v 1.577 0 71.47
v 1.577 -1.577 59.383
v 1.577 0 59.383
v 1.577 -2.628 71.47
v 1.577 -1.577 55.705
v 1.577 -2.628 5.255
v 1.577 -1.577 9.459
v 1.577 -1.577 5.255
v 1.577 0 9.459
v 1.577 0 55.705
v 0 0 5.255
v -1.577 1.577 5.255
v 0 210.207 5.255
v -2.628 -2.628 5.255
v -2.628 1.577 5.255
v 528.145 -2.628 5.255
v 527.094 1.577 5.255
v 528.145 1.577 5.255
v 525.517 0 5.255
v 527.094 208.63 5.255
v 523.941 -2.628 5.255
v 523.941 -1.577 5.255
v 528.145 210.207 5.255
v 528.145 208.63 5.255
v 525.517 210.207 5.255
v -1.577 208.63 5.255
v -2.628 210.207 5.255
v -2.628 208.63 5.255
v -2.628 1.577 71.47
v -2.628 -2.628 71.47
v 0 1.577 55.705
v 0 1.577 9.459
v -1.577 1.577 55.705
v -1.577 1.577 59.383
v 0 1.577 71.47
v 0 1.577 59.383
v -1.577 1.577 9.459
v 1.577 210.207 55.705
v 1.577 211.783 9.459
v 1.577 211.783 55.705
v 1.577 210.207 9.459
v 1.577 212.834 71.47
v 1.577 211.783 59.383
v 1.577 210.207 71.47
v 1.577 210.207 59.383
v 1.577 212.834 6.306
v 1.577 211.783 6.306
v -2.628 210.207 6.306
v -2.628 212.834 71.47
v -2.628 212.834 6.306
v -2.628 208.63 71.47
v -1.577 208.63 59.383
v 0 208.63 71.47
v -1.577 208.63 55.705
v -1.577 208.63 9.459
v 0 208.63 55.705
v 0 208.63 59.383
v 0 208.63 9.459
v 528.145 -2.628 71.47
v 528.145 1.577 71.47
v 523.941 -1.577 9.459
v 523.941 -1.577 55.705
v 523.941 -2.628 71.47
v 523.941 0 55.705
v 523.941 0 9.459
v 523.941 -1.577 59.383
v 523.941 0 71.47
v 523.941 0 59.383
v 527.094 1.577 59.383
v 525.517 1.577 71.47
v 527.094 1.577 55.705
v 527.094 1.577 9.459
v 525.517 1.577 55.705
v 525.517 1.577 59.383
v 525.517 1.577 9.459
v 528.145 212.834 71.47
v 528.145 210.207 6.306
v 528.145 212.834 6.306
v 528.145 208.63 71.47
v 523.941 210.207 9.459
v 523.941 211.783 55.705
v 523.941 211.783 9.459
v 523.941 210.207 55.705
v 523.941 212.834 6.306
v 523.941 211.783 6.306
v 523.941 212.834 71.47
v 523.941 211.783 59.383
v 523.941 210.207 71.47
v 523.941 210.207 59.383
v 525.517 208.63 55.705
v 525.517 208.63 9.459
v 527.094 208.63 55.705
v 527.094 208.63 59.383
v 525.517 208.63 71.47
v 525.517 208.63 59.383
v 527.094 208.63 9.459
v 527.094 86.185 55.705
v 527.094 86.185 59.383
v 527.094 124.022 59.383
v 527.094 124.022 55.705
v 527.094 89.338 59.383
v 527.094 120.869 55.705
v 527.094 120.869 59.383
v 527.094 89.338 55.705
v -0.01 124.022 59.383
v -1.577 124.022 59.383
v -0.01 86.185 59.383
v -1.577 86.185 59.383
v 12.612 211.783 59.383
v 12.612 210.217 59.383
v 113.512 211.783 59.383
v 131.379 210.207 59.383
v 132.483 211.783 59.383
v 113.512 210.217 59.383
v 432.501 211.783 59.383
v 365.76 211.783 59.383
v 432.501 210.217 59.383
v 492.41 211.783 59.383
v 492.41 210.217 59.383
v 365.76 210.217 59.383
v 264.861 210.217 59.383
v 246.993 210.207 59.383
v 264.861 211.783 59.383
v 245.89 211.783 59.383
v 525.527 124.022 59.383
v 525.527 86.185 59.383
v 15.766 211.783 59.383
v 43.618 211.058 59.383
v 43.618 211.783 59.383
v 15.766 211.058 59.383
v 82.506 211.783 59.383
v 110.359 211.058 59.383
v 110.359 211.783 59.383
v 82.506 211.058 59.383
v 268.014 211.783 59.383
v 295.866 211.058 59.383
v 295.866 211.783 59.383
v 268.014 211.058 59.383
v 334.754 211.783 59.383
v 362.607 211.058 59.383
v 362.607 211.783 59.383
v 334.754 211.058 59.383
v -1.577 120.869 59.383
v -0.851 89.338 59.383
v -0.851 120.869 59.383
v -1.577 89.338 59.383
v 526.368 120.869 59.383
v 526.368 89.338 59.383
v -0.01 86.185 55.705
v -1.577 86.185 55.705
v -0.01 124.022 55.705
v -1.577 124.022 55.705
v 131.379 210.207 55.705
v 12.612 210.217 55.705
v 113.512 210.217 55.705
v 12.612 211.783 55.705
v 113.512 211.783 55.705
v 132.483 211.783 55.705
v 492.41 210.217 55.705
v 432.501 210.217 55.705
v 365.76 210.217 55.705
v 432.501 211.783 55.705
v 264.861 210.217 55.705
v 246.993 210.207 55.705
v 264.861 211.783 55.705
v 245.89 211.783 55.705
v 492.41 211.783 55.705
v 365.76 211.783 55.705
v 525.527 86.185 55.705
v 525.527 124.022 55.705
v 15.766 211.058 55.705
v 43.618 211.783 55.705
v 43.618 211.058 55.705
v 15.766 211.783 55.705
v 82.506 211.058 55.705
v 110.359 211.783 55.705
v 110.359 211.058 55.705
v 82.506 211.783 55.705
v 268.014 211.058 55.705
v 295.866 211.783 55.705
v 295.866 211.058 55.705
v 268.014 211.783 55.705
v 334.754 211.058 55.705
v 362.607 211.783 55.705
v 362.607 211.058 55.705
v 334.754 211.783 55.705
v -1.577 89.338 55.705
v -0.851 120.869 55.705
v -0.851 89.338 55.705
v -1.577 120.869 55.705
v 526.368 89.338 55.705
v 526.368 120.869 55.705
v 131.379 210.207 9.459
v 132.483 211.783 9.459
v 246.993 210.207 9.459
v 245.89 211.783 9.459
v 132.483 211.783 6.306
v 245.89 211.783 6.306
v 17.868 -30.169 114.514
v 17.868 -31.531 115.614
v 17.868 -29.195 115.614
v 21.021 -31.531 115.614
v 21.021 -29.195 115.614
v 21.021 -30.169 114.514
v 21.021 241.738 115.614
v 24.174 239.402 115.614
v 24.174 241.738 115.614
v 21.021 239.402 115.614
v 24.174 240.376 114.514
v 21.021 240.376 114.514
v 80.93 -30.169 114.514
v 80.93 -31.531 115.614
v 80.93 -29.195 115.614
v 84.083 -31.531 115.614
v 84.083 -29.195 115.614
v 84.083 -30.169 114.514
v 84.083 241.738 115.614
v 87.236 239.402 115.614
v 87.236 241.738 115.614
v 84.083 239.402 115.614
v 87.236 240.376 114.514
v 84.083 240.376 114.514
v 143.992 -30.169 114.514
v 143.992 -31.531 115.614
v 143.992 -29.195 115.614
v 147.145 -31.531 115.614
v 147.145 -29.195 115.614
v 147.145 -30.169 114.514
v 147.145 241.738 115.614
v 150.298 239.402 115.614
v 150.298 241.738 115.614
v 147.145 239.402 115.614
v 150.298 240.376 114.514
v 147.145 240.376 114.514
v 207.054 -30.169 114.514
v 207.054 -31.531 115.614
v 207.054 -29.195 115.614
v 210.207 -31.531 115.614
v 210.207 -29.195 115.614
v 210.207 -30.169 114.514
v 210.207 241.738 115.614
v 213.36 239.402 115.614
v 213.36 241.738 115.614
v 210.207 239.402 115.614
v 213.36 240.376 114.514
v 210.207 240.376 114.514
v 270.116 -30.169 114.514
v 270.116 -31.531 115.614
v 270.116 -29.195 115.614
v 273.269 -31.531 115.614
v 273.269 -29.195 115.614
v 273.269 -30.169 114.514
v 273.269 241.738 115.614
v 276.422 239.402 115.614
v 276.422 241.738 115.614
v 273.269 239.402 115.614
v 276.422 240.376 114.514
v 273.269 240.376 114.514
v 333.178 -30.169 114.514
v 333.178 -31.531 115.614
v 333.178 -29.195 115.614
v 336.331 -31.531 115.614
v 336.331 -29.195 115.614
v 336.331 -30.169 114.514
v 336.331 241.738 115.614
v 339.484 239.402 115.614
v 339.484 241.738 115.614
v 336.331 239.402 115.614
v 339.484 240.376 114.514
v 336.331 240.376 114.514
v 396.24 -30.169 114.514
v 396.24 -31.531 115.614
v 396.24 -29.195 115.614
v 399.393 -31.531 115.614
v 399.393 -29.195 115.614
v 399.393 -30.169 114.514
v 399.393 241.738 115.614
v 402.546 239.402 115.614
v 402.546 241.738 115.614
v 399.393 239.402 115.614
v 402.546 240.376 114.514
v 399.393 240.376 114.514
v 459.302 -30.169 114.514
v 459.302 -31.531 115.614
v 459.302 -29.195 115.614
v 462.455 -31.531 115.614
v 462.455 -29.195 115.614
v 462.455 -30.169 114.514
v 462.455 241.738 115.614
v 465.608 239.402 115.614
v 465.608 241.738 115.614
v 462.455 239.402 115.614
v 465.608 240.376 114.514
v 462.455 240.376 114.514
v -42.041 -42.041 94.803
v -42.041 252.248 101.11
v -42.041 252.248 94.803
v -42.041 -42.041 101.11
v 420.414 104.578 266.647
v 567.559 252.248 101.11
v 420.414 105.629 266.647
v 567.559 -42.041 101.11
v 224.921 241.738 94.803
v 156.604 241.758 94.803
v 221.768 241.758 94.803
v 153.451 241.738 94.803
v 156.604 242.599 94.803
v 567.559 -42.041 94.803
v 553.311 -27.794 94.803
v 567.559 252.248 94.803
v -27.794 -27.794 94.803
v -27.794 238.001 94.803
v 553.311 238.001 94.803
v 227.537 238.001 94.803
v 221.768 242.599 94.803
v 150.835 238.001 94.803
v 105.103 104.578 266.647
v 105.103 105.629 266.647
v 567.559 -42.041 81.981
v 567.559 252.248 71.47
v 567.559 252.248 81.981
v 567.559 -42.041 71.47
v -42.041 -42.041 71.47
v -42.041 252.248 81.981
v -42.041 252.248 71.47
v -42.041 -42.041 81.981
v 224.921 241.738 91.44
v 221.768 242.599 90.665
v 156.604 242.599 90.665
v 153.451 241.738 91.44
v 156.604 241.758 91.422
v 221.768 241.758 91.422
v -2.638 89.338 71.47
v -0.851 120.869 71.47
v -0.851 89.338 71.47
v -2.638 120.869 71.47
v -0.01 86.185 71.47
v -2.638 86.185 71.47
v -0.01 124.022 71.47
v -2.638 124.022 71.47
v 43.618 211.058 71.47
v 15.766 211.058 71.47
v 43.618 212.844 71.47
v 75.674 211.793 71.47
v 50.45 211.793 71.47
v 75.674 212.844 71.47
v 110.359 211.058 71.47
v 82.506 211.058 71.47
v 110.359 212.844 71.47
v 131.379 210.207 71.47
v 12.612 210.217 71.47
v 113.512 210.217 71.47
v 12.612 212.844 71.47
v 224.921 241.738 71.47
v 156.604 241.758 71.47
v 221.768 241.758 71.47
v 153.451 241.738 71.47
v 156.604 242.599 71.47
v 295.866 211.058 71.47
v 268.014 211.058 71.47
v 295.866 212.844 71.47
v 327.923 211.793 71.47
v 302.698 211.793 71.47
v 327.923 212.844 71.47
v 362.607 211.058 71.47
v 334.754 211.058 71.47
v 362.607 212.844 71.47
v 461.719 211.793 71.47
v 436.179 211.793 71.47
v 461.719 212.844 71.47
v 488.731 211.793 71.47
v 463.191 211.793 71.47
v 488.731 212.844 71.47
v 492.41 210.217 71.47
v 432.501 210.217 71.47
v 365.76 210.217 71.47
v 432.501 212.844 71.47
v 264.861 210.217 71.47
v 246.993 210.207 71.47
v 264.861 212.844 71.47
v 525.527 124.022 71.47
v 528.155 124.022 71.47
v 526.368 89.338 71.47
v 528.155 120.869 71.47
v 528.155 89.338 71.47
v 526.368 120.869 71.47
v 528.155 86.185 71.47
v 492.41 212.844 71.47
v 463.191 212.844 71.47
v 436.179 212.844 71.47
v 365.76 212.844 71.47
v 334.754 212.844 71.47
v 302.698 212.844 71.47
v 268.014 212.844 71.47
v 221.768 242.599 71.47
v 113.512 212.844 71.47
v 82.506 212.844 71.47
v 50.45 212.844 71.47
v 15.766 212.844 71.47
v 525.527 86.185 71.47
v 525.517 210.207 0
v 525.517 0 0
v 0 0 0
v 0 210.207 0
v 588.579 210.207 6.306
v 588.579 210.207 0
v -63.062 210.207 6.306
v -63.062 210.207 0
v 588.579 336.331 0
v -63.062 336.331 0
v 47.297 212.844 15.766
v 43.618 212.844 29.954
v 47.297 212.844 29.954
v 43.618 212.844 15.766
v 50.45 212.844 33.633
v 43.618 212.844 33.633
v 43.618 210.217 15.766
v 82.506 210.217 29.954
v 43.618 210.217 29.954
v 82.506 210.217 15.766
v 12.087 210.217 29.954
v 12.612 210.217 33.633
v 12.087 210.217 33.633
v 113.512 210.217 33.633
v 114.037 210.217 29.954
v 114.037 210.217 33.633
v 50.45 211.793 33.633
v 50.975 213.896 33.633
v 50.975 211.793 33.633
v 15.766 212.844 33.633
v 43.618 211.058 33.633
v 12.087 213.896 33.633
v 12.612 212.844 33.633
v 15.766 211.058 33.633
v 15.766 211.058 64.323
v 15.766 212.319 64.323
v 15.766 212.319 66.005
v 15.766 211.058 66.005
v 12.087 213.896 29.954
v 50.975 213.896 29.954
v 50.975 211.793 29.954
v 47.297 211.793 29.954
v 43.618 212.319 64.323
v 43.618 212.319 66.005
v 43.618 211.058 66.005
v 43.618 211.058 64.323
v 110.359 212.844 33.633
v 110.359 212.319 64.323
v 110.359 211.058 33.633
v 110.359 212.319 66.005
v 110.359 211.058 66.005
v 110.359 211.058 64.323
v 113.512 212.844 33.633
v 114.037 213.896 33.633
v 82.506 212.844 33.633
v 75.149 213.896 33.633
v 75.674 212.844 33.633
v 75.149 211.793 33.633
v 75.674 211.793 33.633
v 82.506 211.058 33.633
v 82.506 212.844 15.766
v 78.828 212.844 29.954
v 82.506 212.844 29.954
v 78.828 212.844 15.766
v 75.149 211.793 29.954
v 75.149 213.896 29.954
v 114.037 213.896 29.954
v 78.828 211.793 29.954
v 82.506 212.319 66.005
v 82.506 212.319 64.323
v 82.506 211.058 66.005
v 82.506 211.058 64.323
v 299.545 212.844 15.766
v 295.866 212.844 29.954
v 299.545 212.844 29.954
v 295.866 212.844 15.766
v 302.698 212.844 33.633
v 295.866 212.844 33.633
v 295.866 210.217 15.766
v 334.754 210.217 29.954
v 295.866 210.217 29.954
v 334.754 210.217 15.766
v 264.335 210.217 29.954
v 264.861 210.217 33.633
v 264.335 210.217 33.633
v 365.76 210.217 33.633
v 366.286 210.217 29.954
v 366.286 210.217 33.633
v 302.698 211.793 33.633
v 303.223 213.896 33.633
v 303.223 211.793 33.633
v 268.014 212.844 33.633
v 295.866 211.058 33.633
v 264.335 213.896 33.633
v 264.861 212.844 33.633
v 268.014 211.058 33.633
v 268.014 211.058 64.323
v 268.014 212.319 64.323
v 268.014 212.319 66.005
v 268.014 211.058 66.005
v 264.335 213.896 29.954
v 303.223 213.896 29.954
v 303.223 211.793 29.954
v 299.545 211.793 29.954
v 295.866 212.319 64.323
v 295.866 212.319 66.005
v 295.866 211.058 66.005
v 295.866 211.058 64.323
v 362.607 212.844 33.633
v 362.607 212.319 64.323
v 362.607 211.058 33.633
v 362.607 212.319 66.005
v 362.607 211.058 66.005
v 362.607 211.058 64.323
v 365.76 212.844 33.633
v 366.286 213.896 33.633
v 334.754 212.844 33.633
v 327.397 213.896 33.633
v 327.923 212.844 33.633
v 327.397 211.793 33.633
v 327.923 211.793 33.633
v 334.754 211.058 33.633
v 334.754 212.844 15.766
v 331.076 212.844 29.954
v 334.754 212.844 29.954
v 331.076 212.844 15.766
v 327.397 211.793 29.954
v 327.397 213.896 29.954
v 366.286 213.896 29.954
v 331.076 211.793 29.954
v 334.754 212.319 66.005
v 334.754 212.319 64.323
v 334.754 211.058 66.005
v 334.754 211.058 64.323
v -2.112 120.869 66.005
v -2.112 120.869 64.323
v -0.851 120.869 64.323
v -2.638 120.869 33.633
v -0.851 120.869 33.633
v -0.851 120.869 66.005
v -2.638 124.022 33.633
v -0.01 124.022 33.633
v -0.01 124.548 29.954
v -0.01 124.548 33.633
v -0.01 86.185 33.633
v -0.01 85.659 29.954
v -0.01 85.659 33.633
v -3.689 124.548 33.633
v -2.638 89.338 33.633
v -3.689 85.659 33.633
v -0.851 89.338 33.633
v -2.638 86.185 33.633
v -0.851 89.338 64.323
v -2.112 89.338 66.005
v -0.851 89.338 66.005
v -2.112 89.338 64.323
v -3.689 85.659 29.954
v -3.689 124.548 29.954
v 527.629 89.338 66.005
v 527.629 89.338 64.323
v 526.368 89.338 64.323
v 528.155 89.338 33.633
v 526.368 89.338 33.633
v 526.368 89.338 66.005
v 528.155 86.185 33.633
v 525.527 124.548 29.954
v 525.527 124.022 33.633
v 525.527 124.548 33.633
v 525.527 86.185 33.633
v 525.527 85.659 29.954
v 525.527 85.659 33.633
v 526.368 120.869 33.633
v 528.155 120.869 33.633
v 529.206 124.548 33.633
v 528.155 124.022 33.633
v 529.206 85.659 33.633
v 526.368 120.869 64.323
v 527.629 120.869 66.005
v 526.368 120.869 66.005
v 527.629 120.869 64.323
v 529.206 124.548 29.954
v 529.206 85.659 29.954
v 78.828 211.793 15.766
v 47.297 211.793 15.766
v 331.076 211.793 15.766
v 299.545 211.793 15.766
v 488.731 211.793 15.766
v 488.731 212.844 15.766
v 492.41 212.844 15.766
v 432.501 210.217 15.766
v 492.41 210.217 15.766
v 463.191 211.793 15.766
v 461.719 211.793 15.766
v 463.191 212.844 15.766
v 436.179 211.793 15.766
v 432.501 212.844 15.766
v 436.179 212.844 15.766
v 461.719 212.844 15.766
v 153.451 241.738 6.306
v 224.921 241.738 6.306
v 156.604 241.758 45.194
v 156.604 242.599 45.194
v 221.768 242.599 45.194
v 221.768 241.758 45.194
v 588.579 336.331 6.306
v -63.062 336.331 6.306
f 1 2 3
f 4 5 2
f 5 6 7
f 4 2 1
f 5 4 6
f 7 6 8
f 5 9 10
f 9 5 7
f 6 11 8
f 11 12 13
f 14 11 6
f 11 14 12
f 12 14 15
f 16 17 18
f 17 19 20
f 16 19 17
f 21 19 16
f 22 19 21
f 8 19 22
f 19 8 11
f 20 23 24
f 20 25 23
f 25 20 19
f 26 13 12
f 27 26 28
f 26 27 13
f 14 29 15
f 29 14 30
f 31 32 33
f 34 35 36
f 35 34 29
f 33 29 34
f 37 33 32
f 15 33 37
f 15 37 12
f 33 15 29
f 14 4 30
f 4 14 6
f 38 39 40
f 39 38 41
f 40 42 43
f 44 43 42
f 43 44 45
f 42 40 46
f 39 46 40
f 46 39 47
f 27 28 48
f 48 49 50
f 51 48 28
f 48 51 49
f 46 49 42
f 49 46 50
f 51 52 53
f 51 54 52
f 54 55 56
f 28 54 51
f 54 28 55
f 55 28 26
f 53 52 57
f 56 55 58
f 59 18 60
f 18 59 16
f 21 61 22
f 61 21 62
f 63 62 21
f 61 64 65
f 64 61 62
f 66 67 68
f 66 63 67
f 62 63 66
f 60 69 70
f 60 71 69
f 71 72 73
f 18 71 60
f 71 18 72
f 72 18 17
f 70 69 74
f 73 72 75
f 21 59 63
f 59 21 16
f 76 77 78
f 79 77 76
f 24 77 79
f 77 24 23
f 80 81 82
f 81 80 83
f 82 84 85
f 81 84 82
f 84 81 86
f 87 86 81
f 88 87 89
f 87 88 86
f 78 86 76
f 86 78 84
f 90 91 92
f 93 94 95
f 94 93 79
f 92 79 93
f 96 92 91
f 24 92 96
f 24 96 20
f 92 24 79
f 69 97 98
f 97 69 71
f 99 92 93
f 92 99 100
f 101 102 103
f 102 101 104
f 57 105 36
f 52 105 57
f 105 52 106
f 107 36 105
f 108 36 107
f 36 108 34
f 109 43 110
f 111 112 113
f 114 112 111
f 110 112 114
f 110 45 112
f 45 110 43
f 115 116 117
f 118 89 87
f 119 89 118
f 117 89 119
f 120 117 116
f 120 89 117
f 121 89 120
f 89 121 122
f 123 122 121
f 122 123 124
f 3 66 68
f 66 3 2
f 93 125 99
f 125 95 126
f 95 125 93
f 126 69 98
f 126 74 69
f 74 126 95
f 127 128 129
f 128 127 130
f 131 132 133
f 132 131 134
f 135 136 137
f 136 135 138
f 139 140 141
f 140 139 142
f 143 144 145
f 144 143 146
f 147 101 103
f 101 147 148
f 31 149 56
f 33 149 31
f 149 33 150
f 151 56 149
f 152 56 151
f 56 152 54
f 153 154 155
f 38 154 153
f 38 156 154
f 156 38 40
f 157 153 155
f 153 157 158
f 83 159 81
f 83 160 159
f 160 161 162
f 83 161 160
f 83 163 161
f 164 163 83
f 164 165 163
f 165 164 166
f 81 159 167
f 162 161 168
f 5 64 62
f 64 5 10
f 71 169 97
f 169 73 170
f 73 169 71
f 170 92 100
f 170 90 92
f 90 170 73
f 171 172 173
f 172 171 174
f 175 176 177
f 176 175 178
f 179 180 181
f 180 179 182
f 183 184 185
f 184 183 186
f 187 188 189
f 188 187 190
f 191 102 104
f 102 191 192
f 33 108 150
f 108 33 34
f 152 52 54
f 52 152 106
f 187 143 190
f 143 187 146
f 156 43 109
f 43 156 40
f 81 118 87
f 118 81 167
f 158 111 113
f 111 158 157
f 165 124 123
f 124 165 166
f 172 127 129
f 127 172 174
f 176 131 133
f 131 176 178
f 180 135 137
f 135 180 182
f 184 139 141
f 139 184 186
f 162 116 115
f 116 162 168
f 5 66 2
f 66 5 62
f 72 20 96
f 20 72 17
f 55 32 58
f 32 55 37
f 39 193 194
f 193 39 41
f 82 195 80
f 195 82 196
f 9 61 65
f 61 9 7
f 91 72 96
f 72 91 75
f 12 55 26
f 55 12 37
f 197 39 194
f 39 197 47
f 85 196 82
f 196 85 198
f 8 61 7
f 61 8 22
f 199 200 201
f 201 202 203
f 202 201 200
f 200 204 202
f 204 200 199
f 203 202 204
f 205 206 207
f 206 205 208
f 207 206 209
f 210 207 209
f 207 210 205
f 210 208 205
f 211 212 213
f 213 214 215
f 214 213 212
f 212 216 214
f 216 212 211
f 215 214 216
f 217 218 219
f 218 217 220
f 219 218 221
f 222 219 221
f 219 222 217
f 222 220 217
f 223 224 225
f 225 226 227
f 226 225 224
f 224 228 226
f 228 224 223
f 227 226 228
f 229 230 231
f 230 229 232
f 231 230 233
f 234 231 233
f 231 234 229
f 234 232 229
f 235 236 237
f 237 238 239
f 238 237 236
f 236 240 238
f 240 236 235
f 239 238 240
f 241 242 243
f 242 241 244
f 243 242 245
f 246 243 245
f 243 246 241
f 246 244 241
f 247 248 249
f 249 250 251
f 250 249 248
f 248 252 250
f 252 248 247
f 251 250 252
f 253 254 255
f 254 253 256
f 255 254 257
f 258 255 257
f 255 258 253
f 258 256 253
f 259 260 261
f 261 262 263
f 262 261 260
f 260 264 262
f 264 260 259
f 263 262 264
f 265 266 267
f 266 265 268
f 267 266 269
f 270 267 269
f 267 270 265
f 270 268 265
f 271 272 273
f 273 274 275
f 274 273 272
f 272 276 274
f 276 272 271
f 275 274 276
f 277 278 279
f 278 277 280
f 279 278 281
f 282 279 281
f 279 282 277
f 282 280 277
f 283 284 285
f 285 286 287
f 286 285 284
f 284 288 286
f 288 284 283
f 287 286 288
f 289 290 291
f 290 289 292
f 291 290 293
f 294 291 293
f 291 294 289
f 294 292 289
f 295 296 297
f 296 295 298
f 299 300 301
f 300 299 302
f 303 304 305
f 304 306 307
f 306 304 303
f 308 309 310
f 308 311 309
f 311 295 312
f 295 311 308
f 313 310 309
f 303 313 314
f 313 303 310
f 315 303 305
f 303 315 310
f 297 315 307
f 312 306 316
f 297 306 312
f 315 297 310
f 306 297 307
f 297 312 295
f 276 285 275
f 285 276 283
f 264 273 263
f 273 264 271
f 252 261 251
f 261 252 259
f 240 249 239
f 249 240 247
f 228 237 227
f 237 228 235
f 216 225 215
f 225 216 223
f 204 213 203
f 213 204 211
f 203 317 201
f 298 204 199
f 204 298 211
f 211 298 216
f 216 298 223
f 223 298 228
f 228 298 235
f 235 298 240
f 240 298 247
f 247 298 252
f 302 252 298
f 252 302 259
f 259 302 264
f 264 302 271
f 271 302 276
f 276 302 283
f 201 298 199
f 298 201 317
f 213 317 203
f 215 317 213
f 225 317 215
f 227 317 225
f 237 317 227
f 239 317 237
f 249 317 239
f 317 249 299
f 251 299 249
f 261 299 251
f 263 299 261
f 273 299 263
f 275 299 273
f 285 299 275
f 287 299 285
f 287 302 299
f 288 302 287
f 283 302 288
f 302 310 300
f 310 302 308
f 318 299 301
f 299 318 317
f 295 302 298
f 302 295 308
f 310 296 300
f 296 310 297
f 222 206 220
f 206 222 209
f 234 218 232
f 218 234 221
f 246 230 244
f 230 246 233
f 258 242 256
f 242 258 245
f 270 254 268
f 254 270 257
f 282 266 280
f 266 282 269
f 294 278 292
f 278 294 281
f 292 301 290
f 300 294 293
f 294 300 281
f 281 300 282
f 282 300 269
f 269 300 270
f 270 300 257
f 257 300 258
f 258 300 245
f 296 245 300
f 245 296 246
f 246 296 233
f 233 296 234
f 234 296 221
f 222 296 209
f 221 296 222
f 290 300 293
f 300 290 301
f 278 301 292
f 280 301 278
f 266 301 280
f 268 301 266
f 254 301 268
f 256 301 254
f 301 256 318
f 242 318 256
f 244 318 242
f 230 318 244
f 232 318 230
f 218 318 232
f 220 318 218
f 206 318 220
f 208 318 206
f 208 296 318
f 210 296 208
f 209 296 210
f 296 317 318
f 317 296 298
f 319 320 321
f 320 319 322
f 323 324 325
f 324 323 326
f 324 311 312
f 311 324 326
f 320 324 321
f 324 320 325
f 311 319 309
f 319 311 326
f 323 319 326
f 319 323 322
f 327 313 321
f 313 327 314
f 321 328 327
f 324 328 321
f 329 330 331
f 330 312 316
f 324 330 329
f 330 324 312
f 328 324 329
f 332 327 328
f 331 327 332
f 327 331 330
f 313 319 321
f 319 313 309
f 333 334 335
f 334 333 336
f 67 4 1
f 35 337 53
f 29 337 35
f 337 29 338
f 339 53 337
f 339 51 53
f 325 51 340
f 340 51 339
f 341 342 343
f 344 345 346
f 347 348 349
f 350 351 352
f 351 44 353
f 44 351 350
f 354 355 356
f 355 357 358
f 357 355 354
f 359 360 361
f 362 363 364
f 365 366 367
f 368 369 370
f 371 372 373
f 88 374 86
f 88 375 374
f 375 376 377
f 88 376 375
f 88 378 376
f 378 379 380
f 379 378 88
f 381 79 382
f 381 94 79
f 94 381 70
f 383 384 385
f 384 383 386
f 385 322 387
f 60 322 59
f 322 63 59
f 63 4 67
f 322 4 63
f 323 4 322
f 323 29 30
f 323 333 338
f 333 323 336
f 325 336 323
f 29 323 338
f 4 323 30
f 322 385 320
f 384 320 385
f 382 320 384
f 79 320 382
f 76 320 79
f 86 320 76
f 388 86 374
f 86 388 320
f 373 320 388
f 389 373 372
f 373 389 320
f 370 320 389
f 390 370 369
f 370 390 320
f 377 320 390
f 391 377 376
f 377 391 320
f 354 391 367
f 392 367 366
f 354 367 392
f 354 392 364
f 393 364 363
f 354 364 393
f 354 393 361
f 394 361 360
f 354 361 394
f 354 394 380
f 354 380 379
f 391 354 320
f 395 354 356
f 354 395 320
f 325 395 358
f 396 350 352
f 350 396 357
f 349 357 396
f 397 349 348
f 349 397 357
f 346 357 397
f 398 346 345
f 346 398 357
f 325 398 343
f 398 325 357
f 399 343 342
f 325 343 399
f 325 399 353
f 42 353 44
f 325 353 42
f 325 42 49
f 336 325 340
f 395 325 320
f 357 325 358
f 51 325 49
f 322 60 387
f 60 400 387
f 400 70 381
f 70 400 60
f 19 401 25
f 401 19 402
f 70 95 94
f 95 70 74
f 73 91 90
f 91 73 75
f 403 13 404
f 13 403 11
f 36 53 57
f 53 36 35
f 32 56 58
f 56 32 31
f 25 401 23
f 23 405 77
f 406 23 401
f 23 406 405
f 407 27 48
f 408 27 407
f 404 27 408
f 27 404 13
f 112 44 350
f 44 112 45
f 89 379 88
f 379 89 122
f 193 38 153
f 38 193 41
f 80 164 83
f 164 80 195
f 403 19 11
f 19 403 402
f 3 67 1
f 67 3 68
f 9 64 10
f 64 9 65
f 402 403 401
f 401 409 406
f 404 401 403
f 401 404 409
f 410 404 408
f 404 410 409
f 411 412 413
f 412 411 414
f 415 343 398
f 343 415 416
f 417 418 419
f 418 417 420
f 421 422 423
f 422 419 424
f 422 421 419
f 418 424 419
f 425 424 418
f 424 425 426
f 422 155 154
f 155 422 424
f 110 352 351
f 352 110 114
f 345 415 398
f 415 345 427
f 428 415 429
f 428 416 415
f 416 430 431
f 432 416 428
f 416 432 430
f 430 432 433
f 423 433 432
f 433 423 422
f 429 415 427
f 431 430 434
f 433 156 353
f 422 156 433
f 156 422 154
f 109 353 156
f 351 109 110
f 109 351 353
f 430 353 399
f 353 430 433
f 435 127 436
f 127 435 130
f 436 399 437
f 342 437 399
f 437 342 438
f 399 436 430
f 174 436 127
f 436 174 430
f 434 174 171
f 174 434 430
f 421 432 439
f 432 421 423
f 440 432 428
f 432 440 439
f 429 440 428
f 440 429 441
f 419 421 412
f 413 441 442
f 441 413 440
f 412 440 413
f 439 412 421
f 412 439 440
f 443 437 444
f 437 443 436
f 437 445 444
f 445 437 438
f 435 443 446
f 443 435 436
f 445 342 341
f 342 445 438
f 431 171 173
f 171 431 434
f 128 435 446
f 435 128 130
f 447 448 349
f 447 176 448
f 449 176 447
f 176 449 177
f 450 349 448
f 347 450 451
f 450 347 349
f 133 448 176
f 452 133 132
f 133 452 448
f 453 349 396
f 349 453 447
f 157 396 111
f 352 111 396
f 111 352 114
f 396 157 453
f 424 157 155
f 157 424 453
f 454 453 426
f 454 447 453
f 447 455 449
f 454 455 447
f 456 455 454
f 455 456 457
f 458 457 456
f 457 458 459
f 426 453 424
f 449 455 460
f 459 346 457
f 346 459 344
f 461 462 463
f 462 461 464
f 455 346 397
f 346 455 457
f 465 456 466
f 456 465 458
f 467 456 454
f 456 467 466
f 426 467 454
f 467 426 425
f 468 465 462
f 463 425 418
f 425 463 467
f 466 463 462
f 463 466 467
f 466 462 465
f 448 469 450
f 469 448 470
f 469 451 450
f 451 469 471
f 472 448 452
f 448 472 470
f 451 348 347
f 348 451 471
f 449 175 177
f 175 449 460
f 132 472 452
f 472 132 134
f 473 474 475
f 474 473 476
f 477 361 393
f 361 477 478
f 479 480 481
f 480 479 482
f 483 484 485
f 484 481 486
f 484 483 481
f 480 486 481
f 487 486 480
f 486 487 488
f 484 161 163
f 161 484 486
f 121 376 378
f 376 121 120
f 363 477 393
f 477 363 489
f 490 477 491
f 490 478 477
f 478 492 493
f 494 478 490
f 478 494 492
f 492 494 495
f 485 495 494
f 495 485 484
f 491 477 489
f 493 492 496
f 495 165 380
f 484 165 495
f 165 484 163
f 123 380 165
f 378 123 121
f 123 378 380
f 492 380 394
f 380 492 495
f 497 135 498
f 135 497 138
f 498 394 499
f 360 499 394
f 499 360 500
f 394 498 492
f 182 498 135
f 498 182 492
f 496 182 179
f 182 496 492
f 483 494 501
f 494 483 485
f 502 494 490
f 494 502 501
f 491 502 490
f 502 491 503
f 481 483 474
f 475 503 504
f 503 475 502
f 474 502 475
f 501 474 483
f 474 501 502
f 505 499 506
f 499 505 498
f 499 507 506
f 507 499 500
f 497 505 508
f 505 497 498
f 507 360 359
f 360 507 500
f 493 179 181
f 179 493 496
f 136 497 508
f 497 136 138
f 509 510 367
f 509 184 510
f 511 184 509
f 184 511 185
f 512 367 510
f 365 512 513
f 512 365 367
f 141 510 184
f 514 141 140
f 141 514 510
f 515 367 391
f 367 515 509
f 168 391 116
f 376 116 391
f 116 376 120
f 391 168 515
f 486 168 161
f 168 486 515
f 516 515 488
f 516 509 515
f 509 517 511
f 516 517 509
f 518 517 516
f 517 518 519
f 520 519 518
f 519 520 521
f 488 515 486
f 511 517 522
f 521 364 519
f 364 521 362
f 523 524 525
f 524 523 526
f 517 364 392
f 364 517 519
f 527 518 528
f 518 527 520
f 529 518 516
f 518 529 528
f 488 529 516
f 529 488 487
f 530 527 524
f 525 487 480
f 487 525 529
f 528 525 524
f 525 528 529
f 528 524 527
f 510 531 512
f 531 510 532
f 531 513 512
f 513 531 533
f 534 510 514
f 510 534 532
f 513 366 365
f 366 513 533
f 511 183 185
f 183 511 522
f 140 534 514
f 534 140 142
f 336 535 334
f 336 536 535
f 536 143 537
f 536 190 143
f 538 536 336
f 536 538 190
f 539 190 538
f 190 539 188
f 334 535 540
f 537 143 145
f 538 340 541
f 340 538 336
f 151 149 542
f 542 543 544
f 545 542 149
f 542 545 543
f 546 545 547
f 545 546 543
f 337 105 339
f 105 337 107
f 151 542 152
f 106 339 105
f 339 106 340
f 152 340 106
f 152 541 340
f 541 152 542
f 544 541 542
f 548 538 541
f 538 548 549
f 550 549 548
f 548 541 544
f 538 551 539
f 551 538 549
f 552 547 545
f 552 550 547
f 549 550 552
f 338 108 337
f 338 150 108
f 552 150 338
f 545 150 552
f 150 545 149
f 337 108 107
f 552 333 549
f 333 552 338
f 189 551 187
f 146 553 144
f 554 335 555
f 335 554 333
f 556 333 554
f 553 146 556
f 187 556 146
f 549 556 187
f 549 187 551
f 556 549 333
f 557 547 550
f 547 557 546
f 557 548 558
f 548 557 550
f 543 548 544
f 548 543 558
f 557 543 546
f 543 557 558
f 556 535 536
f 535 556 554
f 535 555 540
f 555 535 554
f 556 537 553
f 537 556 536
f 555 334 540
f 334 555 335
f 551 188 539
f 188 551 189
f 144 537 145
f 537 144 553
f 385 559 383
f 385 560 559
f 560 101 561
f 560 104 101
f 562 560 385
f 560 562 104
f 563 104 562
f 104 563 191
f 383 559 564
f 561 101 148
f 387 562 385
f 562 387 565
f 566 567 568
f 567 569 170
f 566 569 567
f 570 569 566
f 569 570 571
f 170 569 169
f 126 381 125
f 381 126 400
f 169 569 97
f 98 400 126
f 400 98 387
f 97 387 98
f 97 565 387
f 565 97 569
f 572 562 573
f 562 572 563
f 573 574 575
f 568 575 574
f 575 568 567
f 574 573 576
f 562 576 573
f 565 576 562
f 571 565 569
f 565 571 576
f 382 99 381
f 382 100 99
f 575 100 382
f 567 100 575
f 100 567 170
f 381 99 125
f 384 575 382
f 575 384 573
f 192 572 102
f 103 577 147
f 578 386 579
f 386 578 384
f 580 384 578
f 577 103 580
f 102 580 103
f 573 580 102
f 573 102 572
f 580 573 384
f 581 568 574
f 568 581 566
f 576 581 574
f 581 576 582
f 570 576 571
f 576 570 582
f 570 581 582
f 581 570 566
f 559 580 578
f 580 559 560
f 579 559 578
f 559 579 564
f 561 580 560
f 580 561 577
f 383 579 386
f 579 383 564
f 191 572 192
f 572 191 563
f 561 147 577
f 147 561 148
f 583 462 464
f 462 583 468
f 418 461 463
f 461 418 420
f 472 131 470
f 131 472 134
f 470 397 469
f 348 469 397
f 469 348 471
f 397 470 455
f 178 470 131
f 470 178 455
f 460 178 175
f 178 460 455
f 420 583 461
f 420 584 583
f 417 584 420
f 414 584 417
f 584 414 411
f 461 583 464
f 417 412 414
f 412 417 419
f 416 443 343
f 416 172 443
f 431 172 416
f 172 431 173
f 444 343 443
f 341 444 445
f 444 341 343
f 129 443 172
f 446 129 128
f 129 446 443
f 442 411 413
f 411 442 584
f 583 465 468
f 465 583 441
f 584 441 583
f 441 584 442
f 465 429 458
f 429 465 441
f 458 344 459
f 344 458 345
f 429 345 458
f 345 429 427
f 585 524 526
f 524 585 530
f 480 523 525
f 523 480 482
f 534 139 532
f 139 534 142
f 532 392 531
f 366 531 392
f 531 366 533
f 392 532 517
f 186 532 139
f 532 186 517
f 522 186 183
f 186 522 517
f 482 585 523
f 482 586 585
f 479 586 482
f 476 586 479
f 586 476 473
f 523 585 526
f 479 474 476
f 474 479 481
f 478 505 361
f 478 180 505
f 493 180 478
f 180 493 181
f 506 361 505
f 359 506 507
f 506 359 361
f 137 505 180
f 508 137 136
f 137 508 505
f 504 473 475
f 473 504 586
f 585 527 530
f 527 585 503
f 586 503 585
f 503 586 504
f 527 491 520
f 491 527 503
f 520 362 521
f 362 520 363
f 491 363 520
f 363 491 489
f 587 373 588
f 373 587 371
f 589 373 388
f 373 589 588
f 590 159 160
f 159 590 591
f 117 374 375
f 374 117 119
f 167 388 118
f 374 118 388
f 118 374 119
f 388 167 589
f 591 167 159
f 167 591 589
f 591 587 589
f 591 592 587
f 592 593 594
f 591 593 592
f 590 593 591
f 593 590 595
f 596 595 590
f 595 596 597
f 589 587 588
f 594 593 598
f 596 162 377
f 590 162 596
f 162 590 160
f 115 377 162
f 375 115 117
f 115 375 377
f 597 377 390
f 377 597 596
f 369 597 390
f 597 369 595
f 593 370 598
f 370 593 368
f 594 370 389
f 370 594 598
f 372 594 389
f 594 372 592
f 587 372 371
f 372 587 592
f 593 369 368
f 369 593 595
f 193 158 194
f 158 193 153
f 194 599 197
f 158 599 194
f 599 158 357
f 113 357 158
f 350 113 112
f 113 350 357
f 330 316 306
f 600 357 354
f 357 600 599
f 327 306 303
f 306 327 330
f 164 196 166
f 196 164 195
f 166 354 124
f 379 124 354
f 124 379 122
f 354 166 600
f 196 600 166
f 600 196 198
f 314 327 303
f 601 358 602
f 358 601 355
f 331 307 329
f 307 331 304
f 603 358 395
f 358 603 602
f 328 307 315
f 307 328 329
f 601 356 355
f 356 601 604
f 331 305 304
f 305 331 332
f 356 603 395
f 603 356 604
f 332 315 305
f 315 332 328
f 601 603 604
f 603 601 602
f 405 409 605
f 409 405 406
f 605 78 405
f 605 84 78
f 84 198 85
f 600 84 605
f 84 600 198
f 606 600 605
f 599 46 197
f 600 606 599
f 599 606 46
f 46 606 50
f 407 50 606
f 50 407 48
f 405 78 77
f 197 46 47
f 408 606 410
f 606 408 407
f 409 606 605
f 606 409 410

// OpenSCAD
// =====================================================================
//  MILWAUKEE ROAD - STANDARD 20 X 50 FT PASSENGER DEPOT, LIBERTYVILLE, ILL. (C.M.&ST.P., JAN 15 1900)
//  Album of Depot Plans (1919), sheet 09. Private reference (in copyright):
//  Research Library / RSW / Stations / Standard depots / Album of Depot Plans 1919.
//  Rib Side Works, 24 Nov 2026. FIRST SHAPE MODEL for review - not cut into print sections.
//  KNOWN (from the sheet): 20 x 50 ft; two waiting rooms 12 ft 6, octagonal office bay 11 ft, baggage room 11 ft 6; steep flared hipped roof with cresting, lap siding.
//  ESTIMATE: wall and ridge heights (sheets are small copies), window spacing, colours.
//  Shared depot builder ../../../_common/rsw_depot.scad (x along the track, y = 0 town side,
//  track side +y, feet).  SCALE: 29 = G, 48 = O, 87 = HO.
// =====================================================================
SCALE = 29;
include <../../../_common/rsw_depot.scad>

depot(blocks = [[0, 50, 0, 20, 11, 0.9, 3, 4, 0]],
      pavs   = [],
      wins   = [[3, 1, 3, 6, 3.2], [9, 1, 3, 6, 3.2], [27, 1, 3, 6, 3.2], [33, 1, 3, 6, 3.2], [10, 2, 3, 6, 3.2], [10, 3, 3, 6, 3.2]],
      doors  = [[6, 1, 3, 7.5, 0], [30, 1, 3, 7.5, 0], [44, 1, 5, 8, 1]],
      bays   = [[18, 1, 11, 3]],
      chims  = [[18, 10, 23.0]],
      plat   = [-6, 62, 12, 0.6]);
